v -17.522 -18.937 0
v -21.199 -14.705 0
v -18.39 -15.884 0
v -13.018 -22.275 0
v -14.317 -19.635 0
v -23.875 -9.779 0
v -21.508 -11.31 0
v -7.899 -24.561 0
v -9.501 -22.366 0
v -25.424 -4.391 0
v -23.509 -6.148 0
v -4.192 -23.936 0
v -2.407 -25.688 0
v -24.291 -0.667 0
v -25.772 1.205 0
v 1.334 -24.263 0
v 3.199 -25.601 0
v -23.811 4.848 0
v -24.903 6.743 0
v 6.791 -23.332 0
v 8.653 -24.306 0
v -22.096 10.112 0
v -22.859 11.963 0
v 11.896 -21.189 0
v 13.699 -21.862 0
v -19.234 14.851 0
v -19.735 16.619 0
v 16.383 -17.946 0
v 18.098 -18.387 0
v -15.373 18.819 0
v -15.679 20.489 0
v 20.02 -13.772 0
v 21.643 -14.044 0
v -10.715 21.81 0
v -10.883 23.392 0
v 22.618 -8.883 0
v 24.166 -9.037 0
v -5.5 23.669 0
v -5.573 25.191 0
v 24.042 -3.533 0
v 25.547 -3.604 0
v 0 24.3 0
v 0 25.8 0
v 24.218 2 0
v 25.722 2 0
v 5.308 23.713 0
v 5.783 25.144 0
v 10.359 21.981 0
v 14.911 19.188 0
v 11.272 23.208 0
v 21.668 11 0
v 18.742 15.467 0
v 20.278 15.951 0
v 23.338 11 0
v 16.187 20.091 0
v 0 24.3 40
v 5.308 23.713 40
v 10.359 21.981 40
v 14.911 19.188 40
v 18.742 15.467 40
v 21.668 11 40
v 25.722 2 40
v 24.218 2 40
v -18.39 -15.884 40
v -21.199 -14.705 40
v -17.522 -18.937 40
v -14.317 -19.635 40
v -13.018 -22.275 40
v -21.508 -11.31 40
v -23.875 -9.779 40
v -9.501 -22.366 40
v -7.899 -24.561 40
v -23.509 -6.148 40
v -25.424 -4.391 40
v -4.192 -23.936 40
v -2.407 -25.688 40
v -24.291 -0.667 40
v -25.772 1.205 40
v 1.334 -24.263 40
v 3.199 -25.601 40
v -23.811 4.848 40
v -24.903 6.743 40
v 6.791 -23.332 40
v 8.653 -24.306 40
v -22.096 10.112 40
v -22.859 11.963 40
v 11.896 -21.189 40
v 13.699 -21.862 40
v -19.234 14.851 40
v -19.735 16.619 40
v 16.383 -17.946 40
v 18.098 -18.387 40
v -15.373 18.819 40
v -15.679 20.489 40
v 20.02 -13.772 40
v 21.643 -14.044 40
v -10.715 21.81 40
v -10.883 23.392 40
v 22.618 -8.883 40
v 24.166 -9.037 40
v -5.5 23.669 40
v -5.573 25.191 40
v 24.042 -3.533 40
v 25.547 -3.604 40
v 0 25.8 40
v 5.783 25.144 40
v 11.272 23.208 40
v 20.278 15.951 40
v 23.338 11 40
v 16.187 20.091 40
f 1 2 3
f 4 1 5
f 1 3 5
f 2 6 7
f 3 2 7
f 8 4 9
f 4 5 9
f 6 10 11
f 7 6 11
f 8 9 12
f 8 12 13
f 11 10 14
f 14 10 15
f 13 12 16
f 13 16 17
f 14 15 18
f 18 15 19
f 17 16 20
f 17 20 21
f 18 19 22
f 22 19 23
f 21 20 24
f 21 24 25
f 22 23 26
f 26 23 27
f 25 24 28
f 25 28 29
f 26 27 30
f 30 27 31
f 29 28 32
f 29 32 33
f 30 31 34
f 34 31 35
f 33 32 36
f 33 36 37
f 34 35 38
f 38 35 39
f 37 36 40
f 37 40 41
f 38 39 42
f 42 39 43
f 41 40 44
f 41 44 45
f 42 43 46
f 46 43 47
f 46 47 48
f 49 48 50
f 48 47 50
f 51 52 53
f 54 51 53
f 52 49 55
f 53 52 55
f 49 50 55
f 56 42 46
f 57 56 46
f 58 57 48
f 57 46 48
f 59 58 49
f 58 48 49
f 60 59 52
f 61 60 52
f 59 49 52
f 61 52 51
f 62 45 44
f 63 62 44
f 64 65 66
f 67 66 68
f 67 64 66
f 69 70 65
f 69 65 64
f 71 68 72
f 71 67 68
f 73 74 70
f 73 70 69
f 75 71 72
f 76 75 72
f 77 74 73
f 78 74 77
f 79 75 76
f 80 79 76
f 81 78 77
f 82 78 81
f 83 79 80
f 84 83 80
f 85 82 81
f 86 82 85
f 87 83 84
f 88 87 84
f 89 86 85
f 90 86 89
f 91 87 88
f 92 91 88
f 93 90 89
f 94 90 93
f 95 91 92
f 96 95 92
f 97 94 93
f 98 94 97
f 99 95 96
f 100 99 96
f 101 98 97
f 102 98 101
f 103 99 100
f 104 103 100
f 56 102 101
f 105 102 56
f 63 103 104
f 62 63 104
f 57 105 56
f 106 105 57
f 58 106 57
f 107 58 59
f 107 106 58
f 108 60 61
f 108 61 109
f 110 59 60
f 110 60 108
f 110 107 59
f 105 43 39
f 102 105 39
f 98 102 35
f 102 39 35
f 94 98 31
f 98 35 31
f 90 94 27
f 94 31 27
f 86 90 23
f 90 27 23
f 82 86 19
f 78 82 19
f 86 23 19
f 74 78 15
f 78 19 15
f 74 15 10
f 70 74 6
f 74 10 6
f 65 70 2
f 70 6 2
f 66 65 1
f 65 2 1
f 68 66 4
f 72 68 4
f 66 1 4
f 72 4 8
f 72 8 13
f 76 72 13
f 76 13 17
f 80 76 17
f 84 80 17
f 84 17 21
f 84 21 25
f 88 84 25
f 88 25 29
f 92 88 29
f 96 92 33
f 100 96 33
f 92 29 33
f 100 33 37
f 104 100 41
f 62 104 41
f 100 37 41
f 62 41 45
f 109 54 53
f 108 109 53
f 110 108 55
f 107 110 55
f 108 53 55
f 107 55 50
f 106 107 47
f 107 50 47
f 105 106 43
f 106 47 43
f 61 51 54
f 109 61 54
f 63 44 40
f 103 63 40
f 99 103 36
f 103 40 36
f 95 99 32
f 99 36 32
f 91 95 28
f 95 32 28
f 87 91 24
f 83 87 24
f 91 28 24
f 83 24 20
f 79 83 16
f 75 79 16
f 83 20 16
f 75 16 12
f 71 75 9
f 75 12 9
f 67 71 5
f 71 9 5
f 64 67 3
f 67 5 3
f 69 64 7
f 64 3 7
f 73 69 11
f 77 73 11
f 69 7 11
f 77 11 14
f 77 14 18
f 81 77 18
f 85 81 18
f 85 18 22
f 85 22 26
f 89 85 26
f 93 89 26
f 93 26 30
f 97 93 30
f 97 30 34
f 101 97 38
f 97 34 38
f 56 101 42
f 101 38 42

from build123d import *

# Parameters (mm, degrees)
EXTRUDE_1_DEPTH = 40


with BuildPart() as part:
    # Эскиз1 → Бобышка-Вытянуть1 (new body)
    with BuildSketch(Plane.XY):
        with BuildLine():
            Line((0, 25.8), (0, 24.3))
            ThreePointArc((0, 24.3), (12.712002203, 20.709780298), (21.667717923, 11))
            Line((21.667717923, 11), (23.337523433, 11))
            ThreePointArc((23.337523433, 11), (13.81738036, 21.78807013), (0, 25.8))
        make_face()
        with BuildLine():
            ThreePointArc((24.217555616, 2), (-16.460407042, -17.875821659), (0, 24.3))
            Line((0, 24.3), (0, 25.8))
            ThreePointArc((0, 25.8), (-17.521986189, -18.93726485), (25.722363811, 2))
            Line((25.722363811, 2), (24.217555616, 2))
        make_face()
    extrude(amount=EXTRUDE_1_DEPTH)


solid = part.part
